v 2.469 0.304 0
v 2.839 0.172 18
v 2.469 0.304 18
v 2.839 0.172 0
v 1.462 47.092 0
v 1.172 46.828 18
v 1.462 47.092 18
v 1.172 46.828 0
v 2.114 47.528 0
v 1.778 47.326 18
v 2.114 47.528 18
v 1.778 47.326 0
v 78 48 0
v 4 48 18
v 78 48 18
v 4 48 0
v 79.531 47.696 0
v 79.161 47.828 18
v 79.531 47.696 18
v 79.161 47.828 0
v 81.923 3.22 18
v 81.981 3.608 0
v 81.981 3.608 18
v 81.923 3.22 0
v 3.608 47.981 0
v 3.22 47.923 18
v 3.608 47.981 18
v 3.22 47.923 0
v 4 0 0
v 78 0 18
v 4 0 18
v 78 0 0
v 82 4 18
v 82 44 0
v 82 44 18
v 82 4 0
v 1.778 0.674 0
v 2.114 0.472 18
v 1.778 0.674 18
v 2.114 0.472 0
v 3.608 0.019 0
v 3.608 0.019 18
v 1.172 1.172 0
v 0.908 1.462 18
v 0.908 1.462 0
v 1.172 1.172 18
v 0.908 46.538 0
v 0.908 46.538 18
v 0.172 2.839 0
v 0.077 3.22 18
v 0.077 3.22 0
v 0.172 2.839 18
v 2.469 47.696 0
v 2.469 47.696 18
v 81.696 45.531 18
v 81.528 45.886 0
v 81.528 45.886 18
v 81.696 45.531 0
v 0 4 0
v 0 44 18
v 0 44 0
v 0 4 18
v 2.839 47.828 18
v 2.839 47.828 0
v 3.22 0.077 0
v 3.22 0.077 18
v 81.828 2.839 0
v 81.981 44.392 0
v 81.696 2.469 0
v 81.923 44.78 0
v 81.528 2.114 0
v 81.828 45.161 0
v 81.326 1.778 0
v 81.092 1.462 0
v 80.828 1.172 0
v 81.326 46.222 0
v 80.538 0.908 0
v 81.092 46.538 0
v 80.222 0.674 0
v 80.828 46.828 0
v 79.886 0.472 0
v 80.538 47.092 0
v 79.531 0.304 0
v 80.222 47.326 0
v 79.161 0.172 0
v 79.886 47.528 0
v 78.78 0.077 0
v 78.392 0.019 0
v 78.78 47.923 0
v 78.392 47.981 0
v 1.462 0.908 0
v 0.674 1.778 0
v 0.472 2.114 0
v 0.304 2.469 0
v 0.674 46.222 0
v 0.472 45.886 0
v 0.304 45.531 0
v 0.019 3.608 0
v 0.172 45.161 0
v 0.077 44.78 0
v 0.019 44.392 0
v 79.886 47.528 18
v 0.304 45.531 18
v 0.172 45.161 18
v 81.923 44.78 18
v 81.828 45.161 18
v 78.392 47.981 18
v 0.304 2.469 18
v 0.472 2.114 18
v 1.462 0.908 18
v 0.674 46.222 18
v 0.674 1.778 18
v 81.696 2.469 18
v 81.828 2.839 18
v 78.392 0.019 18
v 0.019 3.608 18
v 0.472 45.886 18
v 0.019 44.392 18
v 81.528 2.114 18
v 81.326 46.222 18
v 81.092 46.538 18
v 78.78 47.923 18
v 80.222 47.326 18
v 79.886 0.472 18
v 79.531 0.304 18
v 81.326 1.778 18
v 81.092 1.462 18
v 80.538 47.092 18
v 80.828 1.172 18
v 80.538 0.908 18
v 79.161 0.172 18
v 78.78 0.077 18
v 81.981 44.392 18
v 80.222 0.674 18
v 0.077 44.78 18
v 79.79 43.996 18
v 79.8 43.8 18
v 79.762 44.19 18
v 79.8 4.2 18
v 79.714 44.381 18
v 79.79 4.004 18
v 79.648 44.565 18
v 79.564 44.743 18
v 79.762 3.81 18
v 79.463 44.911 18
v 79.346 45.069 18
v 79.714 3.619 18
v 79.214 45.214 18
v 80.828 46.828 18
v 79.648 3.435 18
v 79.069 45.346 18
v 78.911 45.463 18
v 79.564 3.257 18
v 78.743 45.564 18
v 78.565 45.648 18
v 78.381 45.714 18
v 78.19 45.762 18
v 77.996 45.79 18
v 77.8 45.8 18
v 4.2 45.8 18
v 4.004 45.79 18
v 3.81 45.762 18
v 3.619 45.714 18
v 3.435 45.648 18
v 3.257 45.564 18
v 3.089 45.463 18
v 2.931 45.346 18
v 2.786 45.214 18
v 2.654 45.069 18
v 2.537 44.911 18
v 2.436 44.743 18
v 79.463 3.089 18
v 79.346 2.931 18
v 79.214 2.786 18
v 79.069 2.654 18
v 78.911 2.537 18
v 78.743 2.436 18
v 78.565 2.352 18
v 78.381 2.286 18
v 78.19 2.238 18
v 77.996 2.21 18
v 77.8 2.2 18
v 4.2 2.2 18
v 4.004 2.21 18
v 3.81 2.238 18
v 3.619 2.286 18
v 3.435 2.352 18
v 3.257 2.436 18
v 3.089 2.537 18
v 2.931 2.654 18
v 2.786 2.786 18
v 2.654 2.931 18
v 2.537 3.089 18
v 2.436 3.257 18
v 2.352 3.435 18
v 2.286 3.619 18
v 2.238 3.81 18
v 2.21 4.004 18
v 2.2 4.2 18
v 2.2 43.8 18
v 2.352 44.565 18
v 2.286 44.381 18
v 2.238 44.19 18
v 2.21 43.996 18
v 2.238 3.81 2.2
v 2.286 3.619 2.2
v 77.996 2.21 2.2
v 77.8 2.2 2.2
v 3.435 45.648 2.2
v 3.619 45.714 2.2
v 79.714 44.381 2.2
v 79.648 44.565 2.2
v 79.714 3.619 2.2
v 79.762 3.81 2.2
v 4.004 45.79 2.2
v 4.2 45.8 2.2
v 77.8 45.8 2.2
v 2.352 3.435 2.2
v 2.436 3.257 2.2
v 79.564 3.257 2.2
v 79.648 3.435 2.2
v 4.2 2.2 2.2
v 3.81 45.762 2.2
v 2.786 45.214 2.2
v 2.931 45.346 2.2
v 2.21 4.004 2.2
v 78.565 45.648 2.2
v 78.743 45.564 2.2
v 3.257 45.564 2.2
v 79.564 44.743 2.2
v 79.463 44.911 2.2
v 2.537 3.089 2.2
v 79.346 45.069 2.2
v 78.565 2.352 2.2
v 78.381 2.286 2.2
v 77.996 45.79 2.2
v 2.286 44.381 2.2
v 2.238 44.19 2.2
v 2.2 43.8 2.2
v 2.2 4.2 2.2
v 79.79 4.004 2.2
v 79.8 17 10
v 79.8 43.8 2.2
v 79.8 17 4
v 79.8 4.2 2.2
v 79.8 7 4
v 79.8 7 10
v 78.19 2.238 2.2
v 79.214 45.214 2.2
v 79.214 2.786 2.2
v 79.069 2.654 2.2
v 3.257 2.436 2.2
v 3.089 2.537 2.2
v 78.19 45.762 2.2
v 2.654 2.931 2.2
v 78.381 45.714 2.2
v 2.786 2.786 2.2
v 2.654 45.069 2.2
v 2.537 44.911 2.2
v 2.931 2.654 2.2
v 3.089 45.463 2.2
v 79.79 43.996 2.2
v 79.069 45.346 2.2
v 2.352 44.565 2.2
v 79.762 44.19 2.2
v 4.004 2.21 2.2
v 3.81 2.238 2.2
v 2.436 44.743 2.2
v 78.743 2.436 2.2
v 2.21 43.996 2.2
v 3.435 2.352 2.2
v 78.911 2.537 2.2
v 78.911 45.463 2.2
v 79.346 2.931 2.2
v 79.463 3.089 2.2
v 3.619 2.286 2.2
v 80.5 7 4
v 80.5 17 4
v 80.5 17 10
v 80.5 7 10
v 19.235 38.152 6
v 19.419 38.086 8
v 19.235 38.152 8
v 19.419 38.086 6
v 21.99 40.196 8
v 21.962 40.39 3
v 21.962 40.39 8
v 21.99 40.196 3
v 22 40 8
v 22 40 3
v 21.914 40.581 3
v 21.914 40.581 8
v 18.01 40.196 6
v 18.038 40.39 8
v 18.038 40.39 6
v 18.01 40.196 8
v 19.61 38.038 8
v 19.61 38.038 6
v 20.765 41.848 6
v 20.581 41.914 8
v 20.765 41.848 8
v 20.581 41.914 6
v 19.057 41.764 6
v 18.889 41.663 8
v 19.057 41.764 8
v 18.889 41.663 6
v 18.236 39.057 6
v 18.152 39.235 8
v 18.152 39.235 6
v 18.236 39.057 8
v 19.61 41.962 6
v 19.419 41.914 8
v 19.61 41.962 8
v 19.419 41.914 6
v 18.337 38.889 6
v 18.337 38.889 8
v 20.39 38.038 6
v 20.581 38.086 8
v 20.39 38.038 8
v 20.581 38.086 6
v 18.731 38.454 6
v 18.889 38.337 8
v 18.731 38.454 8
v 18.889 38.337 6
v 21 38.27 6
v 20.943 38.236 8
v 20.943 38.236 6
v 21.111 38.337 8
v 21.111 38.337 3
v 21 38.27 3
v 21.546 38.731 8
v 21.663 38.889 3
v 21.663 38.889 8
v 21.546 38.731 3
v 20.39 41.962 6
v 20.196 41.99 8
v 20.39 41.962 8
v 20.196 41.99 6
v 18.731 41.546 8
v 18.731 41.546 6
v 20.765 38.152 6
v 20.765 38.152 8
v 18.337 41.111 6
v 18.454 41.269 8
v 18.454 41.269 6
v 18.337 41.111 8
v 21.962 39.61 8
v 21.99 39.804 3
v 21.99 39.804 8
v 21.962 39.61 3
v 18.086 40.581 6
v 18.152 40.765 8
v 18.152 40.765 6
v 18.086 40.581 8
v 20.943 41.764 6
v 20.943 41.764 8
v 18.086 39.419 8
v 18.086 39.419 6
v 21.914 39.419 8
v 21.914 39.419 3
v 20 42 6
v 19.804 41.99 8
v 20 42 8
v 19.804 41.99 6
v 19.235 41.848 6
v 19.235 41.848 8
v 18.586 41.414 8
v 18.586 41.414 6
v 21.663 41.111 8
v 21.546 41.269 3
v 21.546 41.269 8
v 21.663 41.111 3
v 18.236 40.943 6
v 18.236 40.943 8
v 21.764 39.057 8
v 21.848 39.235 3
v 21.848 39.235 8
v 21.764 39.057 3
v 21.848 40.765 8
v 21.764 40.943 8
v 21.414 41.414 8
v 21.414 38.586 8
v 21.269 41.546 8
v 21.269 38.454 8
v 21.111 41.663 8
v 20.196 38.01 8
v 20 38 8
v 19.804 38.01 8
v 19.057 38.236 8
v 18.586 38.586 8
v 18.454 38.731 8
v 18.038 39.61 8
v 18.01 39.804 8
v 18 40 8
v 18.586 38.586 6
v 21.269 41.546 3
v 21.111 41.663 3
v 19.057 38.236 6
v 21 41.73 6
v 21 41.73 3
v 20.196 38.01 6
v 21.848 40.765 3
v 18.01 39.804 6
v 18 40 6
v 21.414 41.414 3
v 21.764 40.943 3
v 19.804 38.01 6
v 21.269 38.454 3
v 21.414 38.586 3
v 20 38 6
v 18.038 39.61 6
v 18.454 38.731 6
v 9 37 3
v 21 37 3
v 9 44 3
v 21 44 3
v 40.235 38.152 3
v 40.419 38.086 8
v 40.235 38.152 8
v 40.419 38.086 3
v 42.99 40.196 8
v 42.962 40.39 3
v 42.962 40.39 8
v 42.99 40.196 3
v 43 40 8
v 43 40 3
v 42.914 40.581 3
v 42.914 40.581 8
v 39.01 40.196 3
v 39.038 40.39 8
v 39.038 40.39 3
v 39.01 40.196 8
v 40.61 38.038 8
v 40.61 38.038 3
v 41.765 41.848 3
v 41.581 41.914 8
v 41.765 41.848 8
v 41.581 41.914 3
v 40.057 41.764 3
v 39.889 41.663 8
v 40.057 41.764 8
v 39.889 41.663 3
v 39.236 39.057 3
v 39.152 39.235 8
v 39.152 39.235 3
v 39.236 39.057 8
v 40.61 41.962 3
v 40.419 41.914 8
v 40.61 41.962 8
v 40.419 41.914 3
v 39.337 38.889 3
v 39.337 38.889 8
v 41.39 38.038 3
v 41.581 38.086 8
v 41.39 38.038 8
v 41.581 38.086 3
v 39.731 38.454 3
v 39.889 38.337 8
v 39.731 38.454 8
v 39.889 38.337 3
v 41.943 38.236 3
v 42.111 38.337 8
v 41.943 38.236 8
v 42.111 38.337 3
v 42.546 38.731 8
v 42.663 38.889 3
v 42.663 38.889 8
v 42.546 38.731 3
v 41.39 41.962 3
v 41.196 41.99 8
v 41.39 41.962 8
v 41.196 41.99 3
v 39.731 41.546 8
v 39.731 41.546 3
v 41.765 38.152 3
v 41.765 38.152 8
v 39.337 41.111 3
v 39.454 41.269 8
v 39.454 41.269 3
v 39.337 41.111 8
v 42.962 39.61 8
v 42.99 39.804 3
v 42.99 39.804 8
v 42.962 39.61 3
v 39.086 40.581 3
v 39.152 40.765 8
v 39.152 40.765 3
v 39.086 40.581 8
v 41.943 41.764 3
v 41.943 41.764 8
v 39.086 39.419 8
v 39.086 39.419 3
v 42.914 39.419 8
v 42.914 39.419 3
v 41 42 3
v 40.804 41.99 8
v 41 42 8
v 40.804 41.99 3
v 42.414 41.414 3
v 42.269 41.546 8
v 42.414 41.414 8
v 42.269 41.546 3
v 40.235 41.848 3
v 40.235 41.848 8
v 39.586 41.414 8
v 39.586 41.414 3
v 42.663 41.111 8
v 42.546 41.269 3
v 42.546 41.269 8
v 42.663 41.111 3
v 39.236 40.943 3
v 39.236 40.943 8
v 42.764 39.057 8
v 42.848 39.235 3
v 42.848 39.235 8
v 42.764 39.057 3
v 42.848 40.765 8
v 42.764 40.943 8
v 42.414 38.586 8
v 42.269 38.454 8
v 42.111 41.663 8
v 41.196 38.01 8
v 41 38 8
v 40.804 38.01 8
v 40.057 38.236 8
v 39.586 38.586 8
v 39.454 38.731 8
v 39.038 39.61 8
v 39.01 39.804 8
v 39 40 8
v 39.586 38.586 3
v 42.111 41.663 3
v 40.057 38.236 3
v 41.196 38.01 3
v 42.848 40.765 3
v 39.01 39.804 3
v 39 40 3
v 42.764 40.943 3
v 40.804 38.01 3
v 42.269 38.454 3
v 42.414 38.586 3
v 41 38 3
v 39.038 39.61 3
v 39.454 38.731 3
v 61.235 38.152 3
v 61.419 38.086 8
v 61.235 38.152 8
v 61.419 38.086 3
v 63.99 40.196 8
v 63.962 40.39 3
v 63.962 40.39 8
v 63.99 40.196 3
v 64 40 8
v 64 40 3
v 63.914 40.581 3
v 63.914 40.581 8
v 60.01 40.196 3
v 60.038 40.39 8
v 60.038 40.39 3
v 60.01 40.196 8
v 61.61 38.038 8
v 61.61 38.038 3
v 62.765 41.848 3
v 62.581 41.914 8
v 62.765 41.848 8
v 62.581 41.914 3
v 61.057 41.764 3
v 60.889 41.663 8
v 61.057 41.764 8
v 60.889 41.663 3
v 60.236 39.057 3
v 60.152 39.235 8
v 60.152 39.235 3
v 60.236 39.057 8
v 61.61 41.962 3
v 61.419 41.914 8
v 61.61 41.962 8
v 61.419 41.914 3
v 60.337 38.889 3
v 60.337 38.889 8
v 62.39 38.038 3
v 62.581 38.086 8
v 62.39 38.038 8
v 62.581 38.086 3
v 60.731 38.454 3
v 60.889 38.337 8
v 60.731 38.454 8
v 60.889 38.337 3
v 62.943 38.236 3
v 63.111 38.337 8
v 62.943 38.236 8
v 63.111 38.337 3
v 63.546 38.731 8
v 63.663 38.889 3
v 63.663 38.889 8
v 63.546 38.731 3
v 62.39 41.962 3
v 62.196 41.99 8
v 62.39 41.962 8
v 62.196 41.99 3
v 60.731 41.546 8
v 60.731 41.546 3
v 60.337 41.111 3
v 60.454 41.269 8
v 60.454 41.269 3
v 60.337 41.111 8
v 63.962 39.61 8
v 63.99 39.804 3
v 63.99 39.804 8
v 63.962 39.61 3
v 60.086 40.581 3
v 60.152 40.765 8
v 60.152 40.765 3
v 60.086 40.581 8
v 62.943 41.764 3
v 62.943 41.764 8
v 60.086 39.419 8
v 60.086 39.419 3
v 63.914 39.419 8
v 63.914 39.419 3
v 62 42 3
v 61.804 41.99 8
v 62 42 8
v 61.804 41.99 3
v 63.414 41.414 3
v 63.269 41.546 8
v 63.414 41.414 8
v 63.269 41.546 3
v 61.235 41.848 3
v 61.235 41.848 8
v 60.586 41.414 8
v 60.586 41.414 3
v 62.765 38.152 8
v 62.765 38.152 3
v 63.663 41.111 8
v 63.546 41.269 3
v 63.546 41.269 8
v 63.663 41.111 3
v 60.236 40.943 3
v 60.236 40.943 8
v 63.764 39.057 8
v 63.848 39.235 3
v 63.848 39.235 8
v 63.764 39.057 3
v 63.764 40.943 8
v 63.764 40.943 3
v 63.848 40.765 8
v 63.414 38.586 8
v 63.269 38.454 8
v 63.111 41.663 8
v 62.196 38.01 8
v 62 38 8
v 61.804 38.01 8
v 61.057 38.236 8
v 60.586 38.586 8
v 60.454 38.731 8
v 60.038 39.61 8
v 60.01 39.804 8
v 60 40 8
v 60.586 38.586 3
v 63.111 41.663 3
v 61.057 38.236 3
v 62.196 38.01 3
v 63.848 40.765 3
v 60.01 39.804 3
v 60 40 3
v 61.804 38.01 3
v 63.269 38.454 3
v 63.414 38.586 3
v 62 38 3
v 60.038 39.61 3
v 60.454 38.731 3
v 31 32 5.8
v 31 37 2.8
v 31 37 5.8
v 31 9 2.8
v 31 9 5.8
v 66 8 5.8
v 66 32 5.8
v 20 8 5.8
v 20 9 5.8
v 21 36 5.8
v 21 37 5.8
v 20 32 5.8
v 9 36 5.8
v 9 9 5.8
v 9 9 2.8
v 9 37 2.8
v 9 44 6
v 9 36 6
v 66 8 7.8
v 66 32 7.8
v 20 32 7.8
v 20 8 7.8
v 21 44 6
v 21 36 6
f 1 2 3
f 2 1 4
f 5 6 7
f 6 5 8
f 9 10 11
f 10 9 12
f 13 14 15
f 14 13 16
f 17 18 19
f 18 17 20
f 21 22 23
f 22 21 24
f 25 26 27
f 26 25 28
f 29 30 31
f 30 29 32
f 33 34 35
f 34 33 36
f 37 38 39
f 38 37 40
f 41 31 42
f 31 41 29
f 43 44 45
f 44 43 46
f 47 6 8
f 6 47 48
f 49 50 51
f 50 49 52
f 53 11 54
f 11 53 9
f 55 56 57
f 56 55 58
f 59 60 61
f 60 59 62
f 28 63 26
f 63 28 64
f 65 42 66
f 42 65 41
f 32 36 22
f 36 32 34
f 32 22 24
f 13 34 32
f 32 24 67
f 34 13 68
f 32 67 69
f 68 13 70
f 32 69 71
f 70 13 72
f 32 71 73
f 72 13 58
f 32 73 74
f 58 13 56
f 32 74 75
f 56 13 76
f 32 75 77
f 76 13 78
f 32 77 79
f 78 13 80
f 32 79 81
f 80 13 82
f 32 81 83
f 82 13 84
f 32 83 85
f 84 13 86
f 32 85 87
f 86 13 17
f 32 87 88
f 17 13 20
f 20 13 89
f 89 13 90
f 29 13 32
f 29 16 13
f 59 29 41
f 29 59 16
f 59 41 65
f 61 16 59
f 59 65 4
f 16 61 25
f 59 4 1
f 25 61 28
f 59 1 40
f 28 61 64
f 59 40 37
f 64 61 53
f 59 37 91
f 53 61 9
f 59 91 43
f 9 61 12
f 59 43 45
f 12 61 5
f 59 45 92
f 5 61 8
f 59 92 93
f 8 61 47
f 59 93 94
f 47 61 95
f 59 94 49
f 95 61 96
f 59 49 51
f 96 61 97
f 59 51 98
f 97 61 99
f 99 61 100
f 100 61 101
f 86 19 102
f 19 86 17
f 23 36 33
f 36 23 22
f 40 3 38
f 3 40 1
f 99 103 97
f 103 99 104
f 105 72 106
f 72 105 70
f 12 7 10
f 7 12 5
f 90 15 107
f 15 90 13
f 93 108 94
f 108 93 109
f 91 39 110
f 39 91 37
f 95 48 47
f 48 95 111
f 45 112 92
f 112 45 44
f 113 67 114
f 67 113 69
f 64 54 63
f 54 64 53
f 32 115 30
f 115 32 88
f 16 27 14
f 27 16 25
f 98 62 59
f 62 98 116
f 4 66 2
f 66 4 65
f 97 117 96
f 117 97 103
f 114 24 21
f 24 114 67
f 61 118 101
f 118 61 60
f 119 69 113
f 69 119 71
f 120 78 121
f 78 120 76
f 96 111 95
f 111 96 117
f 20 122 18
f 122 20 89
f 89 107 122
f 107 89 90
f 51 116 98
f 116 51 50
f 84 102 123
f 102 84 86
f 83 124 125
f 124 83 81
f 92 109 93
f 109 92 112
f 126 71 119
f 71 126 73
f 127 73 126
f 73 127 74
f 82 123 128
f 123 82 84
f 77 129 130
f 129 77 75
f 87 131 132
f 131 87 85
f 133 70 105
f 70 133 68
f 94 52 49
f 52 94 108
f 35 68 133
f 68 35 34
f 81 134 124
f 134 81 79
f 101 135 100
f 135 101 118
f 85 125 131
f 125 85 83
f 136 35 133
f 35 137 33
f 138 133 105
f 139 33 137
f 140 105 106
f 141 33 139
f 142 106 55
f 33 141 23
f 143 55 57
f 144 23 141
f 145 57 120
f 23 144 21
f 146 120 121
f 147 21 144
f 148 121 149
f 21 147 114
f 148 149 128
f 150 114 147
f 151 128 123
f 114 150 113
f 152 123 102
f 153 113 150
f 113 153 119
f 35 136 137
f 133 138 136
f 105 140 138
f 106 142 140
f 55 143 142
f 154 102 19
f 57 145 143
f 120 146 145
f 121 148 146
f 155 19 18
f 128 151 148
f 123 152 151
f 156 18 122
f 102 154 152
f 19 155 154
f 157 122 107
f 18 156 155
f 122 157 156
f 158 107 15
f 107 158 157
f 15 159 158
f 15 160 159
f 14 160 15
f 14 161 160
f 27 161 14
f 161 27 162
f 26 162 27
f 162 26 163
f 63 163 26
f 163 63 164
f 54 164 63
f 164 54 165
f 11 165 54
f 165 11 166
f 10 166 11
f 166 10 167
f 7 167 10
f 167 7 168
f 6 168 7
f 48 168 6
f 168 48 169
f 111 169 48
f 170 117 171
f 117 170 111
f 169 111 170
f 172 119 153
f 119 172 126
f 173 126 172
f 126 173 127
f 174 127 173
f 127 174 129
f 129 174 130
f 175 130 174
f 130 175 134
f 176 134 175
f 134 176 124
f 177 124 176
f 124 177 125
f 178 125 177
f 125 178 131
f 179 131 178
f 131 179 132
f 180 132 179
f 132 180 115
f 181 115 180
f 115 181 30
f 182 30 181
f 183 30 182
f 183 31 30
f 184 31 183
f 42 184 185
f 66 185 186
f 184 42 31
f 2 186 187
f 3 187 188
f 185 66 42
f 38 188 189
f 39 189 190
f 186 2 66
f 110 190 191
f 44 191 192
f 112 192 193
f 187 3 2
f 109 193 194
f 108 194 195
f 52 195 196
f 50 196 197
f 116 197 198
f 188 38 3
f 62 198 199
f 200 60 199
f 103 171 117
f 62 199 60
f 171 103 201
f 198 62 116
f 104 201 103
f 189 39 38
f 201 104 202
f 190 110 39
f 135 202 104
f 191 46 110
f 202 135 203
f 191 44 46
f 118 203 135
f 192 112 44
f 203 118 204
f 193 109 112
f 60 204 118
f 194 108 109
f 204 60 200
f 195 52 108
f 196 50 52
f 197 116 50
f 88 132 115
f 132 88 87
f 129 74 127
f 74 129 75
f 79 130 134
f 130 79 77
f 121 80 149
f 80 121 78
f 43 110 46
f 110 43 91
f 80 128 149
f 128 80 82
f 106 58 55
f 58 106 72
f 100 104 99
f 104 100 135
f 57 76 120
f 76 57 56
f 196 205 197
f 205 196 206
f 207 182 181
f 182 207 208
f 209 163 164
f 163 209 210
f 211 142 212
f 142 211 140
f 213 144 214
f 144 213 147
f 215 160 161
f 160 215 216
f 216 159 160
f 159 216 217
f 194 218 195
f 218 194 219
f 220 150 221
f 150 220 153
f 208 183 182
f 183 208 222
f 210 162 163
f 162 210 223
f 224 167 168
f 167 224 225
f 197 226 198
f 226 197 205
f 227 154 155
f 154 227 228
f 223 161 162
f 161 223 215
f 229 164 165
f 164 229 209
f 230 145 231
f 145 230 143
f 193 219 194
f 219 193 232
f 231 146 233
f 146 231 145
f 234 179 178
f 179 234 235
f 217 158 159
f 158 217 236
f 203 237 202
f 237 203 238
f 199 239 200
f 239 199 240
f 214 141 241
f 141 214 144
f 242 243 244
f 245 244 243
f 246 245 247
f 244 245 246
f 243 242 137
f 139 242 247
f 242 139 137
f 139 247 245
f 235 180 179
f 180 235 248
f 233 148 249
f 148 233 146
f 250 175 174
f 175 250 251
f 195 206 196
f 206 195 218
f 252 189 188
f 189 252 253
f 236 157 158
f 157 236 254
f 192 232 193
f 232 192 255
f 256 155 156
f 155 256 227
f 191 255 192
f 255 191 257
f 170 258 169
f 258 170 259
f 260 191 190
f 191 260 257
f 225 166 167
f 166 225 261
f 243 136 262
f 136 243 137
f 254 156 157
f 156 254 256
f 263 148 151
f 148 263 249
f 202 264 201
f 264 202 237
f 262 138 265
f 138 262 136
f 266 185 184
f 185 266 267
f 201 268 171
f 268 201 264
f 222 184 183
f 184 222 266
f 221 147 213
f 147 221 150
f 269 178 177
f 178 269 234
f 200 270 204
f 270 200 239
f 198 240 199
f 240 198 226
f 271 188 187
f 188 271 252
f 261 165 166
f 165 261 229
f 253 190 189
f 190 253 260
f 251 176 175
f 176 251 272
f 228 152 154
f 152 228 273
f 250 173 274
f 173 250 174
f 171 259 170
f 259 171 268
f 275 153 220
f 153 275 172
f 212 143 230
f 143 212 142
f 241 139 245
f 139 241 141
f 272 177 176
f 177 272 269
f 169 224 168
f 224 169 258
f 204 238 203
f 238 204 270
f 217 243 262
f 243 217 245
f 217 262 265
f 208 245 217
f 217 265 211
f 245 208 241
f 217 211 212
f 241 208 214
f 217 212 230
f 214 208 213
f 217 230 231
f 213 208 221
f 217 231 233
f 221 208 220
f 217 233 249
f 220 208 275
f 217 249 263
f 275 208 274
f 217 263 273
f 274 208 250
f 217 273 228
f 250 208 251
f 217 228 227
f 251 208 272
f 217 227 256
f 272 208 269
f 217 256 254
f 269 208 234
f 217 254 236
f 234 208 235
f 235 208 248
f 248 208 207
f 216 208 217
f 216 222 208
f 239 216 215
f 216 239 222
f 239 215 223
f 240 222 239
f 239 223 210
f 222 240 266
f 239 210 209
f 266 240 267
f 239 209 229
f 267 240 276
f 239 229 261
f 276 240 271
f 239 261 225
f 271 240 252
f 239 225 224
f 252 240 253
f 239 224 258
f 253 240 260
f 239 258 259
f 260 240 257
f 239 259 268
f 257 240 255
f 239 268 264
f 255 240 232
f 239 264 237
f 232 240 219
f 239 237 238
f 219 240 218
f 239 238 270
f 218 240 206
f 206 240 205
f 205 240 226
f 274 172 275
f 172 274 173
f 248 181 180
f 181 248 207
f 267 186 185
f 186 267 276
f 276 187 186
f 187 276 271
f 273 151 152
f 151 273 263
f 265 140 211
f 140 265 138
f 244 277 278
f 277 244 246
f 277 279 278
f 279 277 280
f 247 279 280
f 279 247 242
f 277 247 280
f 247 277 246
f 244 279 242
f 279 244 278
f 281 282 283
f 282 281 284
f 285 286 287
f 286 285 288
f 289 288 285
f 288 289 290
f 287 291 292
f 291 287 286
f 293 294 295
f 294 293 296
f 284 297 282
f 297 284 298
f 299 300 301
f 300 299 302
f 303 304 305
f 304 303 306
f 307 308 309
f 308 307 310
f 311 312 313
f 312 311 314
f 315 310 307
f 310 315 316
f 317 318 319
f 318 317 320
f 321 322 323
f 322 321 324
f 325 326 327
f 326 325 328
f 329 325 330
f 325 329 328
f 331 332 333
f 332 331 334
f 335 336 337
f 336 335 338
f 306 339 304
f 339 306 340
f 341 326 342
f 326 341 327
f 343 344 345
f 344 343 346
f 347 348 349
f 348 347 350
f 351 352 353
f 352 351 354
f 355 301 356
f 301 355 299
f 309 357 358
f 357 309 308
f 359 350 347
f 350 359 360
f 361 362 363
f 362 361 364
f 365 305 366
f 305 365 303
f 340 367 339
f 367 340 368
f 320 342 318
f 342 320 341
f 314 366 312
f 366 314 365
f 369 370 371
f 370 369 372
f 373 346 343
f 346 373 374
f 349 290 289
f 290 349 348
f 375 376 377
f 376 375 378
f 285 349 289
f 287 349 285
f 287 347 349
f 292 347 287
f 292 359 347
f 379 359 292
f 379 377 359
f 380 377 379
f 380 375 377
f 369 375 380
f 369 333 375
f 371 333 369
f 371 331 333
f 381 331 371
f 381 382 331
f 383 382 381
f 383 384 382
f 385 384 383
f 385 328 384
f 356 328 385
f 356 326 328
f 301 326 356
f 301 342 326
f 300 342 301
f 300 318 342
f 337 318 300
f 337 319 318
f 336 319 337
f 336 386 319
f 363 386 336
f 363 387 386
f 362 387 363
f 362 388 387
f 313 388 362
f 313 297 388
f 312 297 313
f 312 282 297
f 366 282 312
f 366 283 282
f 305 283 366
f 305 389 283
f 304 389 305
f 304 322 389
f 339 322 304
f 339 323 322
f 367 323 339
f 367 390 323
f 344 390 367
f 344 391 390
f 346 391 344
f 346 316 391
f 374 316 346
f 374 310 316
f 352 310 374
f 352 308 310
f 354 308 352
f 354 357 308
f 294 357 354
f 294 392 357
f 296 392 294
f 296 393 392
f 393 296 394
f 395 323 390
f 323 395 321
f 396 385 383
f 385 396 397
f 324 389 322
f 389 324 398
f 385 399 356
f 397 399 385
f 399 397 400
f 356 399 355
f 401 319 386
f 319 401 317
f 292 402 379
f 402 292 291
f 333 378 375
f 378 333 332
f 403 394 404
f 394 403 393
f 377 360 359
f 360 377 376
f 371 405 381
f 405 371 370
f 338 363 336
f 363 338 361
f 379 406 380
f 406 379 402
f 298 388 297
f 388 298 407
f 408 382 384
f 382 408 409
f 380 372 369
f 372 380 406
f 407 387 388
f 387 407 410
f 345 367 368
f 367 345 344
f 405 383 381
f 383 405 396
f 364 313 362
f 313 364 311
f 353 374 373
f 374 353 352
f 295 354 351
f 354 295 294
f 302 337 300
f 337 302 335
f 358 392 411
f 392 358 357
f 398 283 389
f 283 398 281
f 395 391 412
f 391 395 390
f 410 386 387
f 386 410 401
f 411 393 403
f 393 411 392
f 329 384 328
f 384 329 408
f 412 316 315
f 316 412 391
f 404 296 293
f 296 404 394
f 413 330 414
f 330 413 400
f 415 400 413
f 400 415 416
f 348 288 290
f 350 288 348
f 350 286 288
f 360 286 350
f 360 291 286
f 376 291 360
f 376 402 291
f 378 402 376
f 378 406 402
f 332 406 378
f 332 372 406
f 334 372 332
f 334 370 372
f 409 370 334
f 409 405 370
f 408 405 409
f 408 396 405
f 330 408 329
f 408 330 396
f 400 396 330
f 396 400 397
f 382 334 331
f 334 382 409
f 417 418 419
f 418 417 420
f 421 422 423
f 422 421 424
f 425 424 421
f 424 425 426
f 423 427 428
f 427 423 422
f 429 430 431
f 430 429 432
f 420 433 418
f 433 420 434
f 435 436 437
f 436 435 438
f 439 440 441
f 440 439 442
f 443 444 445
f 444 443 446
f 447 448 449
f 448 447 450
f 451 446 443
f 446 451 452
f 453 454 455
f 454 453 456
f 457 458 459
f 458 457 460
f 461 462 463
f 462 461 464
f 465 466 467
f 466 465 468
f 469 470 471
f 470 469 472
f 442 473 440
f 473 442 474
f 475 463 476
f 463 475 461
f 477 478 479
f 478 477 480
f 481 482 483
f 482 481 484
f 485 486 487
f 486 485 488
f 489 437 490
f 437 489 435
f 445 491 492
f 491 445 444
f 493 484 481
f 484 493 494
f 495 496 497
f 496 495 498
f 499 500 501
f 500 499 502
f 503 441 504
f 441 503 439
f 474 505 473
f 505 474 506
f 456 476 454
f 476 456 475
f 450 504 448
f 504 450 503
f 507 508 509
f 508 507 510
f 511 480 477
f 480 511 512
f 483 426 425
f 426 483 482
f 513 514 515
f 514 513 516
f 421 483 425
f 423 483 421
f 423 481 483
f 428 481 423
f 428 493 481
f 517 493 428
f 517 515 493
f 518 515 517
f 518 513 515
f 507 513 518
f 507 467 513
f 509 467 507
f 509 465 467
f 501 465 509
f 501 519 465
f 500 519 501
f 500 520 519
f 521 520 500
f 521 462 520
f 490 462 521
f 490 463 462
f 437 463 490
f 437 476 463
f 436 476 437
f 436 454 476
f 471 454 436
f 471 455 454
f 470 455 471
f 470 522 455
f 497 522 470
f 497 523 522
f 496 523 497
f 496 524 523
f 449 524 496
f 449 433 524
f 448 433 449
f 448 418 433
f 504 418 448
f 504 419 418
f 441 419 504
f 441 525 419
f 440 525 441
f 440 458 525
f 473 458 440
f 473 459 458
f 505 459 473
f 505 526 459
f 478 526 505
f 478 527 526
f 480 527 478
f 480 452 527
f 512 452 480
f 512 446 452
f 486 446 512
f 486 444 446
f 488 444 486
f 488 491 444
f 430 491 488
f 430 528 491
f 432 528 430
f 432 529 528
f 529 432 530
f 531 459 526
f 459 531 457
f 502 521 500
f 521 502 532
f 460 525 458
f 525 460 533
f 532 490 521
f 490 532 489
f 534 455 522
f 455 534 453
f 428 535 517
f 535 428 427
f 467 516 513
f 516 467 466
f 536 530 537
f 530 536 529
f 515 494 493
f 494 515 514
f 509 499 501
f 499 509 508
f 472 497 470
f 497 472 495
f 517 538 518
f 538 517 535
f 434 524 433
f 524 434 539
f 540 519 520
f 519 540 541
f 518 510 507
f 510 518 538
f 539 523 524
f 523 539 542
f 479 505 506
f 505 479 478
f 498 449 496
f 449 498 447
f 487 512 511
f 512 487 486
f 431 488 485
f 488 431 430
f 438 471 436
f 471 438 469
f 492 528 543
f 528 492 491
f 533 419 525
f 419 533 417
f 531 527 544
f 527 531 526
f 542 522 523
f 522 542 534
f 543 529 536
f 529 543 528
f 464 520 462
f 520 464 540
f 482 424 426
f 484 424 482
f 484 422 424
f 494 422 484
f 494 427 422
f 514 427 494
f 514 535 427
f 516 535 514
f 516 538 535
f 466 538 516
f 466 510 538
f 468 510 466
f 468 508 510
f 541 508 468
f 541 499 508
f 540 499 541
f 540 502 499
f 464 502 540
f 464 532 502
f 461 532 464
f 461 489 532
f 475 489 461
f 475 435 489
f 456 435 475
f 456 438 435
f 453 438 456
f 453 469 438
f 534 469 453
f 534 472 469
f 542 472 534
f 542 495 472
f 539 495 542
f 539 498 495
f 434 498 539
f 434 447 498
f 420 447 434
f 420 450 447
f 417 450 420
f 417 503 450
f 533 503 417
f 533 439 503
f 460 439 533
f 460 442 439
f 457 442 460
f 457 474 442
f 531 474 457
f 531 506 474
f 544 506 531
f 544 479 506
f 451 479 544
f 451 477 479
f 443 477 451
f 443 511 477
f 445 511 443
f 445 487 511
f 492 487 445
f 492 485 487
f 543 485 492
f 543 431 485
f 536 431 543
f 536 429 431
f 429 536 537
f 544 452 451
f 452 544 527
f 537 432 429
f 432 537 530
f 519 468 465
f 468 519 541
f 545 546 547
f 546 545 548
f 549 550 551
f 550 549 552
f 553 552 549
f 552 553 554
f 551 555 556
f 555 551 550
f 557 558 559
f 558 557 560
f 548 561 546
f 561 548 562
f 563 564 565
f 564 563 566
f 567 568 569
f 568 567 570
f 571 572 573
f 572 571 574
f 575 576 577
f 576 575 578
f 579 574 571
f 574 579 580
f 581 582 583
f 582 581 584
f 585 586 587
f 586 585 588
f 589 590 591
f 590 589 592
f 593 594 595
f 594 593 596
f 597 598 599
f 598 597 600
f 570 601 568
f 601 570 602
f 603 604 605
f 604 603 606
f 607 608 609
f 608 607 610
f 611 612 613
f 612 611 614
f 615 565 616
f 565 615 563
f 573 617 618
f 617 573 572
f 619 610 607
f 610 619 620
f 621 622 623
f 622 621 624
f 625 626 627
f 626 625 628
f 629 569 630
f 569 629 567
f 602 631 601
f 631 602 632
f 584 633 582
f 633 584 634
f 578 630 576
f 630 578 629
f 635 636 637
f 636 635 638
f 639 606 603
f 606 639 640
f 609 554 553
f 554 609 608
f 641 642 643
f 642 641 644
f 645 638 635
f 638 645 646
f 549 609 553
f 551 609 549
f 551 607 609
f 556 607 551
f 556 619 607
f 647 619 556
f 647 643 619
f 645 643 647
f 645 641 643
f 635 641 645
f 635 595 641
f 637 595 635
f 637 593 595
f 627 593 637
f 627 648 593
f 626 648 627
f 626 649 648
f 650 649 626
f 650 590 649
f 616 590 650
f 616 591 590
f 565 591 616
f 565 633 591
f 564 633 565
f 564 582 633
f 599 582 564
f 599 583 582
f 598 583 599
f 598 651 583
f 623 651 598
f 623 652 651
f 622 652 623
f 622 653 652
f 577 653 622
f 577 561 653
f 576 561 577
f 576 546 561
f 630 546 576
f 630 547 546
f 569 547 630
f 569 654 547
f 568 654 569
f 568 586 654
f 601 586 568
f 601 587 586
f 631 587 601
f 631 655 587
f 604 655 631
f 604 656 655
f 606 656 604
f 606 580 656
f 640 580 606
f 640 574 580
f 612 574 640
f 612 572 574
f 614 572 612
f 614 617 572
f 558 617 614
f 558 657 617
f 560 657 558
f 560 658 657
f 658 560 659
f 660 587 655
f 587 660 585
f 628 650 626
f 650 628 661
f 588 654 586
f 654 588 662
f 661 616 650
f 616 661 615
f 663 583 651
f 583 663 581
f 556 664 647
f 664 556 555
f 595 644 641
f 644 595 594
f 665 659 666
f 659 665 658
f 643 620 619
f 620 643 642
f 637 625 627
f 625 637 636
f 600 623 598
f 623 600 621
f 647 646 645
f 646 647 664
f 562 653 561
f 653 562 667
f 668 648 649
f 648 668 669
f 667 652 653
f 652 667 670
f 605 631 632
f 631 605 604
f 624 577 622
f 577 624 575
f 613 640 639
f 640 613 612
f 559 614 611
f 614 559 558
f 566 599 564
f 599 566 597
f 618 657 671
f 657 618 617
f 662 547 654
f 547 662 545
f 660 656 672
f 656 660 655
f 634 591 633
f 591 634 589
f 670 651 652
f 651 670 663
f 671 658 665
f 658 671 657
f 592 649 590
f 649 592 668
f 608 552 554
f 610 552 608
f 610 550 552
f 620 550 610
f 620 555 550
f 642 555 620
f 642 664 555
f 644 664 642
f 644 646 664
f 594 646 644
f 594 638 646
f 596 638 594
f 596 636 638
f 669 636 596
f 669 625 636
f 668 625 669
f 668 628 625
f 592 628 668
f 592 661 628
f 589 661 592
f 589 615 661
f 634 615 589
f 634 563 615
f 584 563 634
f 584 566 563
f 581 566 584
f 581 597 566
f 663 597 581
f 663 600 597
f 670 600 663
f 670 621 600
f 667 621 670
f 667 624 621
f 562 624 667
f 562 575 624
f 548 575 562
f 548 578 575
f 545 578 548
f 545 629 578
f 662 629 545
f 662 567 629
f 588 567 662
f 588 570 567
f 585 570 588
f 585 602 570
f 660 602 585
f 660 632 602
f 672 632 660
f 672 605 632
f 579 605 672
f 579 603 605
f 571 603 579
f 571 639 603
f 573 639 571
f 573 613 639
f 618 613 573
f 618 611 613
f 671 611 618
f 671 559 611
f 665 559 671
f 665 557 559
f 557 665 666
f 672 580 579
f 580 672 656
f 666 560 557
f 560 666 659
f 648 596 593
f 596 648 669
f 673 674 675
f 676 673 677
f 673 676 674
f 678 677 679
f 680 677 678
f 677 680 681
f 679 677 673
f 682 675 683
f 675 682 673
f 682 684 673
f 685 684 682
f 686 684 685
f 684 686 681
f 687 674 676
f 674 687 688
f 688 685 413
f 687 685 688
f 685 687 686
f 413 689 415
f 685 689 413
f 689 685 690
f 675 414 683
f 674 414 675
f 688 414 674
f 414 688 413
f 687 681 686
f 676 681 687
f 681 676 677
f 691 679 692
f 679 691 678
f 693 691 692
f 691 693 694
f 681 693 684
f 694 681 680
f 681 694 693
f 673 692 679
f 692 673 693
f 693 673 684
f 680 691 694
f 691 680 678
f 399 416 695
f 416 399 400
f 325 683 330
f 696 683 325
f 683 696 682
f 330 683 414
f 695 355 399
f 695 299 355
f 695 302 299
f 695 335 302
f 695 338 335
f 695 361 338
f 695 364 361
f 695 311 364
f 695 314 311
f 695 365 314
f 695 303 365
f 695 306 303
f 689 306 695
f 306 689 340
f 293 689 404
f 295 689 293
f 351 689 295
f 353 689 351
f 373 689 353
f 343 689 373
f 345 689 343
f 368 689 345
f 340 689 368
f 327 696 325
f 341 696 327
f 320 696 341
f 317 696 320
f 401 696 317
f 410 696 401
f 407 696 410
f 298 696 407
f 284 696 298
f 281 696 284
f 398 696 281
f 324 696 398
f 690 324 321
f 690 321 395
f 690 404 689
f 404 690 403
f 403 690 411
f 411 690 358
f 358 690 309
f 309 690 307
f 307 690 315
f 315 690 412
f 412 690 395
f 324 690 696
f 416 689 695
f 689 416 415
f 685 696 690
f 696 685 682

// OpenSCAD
$fn=64;

// INTENSE SCRAP — translucent CAD-style enclosure
// Spotify display + 3 physical controls, no rotary encoder.

W = 82;
D = 48;
H = 18;
wall = 2.2;

module rounded_box(s, r) {
    hull() {
        for (x=[r,s[0]-r])
            for (y=[r,s[1]-r])
                translate([x,y,0]) cylinder(h=s[2], r=r);
    }
}

module shell() {
    difference() {
        rounded_box([W,D,H], 4);

        // Hollow interior while keeping a light, frosted/translucent shell.
        translate([wall,wall,wall])
            rounded_box([W-2*wall,D-2*wall,H], 2);

        // 1.8" TFT display opening — display is not touchscreen.
        translate([18,8,H-3]) cube([46,24,6]);

        // Three physical music controls: previous / play-pause / next.
        for (x=[20,41,62])
            translate([x,40,H-3]) cylinder(h=6,r=2.8);

        // USB-C side opening.
        translate([W-4,12,7])
            rotate([0,90,0]) cube([6,10,5],center=true);

        // Optional wired-headphone opening.
        translate([4,36,8])
            rotate([0,90,0]) cylinder(h=6,r=3.2);
    }
}

// Simple internal placeholders for CAD preview/assembly context.
// These are intentionally subtle so the shell reads as translucent/frosted.
module electronics_preview() {
    color([0.12,0.12,0.12,0.55])
        translate([9,9,2.8]) cube([22,28,3]);       // ESP32 board
    color([0.05,0.05,0.05,0.65])
        translate([20,8,5.8]) cube([46,24,2]);      // TFT body
    color([0.85,0.85,0.85,0.7])
        translate([9,36,3]) cube([12,8,3]);         // battery area
    color([0.95,0.95,0.95,0.8])
        for (x=[20,41,62])
            translate([x,40,3]) cylinder(h=5,r=2.0); // tactile buttons
}

// Light/frosted appearance for CAD inspection.
color([0.94,0.94,0.94,0.58]) shell();
electronics_preview();
